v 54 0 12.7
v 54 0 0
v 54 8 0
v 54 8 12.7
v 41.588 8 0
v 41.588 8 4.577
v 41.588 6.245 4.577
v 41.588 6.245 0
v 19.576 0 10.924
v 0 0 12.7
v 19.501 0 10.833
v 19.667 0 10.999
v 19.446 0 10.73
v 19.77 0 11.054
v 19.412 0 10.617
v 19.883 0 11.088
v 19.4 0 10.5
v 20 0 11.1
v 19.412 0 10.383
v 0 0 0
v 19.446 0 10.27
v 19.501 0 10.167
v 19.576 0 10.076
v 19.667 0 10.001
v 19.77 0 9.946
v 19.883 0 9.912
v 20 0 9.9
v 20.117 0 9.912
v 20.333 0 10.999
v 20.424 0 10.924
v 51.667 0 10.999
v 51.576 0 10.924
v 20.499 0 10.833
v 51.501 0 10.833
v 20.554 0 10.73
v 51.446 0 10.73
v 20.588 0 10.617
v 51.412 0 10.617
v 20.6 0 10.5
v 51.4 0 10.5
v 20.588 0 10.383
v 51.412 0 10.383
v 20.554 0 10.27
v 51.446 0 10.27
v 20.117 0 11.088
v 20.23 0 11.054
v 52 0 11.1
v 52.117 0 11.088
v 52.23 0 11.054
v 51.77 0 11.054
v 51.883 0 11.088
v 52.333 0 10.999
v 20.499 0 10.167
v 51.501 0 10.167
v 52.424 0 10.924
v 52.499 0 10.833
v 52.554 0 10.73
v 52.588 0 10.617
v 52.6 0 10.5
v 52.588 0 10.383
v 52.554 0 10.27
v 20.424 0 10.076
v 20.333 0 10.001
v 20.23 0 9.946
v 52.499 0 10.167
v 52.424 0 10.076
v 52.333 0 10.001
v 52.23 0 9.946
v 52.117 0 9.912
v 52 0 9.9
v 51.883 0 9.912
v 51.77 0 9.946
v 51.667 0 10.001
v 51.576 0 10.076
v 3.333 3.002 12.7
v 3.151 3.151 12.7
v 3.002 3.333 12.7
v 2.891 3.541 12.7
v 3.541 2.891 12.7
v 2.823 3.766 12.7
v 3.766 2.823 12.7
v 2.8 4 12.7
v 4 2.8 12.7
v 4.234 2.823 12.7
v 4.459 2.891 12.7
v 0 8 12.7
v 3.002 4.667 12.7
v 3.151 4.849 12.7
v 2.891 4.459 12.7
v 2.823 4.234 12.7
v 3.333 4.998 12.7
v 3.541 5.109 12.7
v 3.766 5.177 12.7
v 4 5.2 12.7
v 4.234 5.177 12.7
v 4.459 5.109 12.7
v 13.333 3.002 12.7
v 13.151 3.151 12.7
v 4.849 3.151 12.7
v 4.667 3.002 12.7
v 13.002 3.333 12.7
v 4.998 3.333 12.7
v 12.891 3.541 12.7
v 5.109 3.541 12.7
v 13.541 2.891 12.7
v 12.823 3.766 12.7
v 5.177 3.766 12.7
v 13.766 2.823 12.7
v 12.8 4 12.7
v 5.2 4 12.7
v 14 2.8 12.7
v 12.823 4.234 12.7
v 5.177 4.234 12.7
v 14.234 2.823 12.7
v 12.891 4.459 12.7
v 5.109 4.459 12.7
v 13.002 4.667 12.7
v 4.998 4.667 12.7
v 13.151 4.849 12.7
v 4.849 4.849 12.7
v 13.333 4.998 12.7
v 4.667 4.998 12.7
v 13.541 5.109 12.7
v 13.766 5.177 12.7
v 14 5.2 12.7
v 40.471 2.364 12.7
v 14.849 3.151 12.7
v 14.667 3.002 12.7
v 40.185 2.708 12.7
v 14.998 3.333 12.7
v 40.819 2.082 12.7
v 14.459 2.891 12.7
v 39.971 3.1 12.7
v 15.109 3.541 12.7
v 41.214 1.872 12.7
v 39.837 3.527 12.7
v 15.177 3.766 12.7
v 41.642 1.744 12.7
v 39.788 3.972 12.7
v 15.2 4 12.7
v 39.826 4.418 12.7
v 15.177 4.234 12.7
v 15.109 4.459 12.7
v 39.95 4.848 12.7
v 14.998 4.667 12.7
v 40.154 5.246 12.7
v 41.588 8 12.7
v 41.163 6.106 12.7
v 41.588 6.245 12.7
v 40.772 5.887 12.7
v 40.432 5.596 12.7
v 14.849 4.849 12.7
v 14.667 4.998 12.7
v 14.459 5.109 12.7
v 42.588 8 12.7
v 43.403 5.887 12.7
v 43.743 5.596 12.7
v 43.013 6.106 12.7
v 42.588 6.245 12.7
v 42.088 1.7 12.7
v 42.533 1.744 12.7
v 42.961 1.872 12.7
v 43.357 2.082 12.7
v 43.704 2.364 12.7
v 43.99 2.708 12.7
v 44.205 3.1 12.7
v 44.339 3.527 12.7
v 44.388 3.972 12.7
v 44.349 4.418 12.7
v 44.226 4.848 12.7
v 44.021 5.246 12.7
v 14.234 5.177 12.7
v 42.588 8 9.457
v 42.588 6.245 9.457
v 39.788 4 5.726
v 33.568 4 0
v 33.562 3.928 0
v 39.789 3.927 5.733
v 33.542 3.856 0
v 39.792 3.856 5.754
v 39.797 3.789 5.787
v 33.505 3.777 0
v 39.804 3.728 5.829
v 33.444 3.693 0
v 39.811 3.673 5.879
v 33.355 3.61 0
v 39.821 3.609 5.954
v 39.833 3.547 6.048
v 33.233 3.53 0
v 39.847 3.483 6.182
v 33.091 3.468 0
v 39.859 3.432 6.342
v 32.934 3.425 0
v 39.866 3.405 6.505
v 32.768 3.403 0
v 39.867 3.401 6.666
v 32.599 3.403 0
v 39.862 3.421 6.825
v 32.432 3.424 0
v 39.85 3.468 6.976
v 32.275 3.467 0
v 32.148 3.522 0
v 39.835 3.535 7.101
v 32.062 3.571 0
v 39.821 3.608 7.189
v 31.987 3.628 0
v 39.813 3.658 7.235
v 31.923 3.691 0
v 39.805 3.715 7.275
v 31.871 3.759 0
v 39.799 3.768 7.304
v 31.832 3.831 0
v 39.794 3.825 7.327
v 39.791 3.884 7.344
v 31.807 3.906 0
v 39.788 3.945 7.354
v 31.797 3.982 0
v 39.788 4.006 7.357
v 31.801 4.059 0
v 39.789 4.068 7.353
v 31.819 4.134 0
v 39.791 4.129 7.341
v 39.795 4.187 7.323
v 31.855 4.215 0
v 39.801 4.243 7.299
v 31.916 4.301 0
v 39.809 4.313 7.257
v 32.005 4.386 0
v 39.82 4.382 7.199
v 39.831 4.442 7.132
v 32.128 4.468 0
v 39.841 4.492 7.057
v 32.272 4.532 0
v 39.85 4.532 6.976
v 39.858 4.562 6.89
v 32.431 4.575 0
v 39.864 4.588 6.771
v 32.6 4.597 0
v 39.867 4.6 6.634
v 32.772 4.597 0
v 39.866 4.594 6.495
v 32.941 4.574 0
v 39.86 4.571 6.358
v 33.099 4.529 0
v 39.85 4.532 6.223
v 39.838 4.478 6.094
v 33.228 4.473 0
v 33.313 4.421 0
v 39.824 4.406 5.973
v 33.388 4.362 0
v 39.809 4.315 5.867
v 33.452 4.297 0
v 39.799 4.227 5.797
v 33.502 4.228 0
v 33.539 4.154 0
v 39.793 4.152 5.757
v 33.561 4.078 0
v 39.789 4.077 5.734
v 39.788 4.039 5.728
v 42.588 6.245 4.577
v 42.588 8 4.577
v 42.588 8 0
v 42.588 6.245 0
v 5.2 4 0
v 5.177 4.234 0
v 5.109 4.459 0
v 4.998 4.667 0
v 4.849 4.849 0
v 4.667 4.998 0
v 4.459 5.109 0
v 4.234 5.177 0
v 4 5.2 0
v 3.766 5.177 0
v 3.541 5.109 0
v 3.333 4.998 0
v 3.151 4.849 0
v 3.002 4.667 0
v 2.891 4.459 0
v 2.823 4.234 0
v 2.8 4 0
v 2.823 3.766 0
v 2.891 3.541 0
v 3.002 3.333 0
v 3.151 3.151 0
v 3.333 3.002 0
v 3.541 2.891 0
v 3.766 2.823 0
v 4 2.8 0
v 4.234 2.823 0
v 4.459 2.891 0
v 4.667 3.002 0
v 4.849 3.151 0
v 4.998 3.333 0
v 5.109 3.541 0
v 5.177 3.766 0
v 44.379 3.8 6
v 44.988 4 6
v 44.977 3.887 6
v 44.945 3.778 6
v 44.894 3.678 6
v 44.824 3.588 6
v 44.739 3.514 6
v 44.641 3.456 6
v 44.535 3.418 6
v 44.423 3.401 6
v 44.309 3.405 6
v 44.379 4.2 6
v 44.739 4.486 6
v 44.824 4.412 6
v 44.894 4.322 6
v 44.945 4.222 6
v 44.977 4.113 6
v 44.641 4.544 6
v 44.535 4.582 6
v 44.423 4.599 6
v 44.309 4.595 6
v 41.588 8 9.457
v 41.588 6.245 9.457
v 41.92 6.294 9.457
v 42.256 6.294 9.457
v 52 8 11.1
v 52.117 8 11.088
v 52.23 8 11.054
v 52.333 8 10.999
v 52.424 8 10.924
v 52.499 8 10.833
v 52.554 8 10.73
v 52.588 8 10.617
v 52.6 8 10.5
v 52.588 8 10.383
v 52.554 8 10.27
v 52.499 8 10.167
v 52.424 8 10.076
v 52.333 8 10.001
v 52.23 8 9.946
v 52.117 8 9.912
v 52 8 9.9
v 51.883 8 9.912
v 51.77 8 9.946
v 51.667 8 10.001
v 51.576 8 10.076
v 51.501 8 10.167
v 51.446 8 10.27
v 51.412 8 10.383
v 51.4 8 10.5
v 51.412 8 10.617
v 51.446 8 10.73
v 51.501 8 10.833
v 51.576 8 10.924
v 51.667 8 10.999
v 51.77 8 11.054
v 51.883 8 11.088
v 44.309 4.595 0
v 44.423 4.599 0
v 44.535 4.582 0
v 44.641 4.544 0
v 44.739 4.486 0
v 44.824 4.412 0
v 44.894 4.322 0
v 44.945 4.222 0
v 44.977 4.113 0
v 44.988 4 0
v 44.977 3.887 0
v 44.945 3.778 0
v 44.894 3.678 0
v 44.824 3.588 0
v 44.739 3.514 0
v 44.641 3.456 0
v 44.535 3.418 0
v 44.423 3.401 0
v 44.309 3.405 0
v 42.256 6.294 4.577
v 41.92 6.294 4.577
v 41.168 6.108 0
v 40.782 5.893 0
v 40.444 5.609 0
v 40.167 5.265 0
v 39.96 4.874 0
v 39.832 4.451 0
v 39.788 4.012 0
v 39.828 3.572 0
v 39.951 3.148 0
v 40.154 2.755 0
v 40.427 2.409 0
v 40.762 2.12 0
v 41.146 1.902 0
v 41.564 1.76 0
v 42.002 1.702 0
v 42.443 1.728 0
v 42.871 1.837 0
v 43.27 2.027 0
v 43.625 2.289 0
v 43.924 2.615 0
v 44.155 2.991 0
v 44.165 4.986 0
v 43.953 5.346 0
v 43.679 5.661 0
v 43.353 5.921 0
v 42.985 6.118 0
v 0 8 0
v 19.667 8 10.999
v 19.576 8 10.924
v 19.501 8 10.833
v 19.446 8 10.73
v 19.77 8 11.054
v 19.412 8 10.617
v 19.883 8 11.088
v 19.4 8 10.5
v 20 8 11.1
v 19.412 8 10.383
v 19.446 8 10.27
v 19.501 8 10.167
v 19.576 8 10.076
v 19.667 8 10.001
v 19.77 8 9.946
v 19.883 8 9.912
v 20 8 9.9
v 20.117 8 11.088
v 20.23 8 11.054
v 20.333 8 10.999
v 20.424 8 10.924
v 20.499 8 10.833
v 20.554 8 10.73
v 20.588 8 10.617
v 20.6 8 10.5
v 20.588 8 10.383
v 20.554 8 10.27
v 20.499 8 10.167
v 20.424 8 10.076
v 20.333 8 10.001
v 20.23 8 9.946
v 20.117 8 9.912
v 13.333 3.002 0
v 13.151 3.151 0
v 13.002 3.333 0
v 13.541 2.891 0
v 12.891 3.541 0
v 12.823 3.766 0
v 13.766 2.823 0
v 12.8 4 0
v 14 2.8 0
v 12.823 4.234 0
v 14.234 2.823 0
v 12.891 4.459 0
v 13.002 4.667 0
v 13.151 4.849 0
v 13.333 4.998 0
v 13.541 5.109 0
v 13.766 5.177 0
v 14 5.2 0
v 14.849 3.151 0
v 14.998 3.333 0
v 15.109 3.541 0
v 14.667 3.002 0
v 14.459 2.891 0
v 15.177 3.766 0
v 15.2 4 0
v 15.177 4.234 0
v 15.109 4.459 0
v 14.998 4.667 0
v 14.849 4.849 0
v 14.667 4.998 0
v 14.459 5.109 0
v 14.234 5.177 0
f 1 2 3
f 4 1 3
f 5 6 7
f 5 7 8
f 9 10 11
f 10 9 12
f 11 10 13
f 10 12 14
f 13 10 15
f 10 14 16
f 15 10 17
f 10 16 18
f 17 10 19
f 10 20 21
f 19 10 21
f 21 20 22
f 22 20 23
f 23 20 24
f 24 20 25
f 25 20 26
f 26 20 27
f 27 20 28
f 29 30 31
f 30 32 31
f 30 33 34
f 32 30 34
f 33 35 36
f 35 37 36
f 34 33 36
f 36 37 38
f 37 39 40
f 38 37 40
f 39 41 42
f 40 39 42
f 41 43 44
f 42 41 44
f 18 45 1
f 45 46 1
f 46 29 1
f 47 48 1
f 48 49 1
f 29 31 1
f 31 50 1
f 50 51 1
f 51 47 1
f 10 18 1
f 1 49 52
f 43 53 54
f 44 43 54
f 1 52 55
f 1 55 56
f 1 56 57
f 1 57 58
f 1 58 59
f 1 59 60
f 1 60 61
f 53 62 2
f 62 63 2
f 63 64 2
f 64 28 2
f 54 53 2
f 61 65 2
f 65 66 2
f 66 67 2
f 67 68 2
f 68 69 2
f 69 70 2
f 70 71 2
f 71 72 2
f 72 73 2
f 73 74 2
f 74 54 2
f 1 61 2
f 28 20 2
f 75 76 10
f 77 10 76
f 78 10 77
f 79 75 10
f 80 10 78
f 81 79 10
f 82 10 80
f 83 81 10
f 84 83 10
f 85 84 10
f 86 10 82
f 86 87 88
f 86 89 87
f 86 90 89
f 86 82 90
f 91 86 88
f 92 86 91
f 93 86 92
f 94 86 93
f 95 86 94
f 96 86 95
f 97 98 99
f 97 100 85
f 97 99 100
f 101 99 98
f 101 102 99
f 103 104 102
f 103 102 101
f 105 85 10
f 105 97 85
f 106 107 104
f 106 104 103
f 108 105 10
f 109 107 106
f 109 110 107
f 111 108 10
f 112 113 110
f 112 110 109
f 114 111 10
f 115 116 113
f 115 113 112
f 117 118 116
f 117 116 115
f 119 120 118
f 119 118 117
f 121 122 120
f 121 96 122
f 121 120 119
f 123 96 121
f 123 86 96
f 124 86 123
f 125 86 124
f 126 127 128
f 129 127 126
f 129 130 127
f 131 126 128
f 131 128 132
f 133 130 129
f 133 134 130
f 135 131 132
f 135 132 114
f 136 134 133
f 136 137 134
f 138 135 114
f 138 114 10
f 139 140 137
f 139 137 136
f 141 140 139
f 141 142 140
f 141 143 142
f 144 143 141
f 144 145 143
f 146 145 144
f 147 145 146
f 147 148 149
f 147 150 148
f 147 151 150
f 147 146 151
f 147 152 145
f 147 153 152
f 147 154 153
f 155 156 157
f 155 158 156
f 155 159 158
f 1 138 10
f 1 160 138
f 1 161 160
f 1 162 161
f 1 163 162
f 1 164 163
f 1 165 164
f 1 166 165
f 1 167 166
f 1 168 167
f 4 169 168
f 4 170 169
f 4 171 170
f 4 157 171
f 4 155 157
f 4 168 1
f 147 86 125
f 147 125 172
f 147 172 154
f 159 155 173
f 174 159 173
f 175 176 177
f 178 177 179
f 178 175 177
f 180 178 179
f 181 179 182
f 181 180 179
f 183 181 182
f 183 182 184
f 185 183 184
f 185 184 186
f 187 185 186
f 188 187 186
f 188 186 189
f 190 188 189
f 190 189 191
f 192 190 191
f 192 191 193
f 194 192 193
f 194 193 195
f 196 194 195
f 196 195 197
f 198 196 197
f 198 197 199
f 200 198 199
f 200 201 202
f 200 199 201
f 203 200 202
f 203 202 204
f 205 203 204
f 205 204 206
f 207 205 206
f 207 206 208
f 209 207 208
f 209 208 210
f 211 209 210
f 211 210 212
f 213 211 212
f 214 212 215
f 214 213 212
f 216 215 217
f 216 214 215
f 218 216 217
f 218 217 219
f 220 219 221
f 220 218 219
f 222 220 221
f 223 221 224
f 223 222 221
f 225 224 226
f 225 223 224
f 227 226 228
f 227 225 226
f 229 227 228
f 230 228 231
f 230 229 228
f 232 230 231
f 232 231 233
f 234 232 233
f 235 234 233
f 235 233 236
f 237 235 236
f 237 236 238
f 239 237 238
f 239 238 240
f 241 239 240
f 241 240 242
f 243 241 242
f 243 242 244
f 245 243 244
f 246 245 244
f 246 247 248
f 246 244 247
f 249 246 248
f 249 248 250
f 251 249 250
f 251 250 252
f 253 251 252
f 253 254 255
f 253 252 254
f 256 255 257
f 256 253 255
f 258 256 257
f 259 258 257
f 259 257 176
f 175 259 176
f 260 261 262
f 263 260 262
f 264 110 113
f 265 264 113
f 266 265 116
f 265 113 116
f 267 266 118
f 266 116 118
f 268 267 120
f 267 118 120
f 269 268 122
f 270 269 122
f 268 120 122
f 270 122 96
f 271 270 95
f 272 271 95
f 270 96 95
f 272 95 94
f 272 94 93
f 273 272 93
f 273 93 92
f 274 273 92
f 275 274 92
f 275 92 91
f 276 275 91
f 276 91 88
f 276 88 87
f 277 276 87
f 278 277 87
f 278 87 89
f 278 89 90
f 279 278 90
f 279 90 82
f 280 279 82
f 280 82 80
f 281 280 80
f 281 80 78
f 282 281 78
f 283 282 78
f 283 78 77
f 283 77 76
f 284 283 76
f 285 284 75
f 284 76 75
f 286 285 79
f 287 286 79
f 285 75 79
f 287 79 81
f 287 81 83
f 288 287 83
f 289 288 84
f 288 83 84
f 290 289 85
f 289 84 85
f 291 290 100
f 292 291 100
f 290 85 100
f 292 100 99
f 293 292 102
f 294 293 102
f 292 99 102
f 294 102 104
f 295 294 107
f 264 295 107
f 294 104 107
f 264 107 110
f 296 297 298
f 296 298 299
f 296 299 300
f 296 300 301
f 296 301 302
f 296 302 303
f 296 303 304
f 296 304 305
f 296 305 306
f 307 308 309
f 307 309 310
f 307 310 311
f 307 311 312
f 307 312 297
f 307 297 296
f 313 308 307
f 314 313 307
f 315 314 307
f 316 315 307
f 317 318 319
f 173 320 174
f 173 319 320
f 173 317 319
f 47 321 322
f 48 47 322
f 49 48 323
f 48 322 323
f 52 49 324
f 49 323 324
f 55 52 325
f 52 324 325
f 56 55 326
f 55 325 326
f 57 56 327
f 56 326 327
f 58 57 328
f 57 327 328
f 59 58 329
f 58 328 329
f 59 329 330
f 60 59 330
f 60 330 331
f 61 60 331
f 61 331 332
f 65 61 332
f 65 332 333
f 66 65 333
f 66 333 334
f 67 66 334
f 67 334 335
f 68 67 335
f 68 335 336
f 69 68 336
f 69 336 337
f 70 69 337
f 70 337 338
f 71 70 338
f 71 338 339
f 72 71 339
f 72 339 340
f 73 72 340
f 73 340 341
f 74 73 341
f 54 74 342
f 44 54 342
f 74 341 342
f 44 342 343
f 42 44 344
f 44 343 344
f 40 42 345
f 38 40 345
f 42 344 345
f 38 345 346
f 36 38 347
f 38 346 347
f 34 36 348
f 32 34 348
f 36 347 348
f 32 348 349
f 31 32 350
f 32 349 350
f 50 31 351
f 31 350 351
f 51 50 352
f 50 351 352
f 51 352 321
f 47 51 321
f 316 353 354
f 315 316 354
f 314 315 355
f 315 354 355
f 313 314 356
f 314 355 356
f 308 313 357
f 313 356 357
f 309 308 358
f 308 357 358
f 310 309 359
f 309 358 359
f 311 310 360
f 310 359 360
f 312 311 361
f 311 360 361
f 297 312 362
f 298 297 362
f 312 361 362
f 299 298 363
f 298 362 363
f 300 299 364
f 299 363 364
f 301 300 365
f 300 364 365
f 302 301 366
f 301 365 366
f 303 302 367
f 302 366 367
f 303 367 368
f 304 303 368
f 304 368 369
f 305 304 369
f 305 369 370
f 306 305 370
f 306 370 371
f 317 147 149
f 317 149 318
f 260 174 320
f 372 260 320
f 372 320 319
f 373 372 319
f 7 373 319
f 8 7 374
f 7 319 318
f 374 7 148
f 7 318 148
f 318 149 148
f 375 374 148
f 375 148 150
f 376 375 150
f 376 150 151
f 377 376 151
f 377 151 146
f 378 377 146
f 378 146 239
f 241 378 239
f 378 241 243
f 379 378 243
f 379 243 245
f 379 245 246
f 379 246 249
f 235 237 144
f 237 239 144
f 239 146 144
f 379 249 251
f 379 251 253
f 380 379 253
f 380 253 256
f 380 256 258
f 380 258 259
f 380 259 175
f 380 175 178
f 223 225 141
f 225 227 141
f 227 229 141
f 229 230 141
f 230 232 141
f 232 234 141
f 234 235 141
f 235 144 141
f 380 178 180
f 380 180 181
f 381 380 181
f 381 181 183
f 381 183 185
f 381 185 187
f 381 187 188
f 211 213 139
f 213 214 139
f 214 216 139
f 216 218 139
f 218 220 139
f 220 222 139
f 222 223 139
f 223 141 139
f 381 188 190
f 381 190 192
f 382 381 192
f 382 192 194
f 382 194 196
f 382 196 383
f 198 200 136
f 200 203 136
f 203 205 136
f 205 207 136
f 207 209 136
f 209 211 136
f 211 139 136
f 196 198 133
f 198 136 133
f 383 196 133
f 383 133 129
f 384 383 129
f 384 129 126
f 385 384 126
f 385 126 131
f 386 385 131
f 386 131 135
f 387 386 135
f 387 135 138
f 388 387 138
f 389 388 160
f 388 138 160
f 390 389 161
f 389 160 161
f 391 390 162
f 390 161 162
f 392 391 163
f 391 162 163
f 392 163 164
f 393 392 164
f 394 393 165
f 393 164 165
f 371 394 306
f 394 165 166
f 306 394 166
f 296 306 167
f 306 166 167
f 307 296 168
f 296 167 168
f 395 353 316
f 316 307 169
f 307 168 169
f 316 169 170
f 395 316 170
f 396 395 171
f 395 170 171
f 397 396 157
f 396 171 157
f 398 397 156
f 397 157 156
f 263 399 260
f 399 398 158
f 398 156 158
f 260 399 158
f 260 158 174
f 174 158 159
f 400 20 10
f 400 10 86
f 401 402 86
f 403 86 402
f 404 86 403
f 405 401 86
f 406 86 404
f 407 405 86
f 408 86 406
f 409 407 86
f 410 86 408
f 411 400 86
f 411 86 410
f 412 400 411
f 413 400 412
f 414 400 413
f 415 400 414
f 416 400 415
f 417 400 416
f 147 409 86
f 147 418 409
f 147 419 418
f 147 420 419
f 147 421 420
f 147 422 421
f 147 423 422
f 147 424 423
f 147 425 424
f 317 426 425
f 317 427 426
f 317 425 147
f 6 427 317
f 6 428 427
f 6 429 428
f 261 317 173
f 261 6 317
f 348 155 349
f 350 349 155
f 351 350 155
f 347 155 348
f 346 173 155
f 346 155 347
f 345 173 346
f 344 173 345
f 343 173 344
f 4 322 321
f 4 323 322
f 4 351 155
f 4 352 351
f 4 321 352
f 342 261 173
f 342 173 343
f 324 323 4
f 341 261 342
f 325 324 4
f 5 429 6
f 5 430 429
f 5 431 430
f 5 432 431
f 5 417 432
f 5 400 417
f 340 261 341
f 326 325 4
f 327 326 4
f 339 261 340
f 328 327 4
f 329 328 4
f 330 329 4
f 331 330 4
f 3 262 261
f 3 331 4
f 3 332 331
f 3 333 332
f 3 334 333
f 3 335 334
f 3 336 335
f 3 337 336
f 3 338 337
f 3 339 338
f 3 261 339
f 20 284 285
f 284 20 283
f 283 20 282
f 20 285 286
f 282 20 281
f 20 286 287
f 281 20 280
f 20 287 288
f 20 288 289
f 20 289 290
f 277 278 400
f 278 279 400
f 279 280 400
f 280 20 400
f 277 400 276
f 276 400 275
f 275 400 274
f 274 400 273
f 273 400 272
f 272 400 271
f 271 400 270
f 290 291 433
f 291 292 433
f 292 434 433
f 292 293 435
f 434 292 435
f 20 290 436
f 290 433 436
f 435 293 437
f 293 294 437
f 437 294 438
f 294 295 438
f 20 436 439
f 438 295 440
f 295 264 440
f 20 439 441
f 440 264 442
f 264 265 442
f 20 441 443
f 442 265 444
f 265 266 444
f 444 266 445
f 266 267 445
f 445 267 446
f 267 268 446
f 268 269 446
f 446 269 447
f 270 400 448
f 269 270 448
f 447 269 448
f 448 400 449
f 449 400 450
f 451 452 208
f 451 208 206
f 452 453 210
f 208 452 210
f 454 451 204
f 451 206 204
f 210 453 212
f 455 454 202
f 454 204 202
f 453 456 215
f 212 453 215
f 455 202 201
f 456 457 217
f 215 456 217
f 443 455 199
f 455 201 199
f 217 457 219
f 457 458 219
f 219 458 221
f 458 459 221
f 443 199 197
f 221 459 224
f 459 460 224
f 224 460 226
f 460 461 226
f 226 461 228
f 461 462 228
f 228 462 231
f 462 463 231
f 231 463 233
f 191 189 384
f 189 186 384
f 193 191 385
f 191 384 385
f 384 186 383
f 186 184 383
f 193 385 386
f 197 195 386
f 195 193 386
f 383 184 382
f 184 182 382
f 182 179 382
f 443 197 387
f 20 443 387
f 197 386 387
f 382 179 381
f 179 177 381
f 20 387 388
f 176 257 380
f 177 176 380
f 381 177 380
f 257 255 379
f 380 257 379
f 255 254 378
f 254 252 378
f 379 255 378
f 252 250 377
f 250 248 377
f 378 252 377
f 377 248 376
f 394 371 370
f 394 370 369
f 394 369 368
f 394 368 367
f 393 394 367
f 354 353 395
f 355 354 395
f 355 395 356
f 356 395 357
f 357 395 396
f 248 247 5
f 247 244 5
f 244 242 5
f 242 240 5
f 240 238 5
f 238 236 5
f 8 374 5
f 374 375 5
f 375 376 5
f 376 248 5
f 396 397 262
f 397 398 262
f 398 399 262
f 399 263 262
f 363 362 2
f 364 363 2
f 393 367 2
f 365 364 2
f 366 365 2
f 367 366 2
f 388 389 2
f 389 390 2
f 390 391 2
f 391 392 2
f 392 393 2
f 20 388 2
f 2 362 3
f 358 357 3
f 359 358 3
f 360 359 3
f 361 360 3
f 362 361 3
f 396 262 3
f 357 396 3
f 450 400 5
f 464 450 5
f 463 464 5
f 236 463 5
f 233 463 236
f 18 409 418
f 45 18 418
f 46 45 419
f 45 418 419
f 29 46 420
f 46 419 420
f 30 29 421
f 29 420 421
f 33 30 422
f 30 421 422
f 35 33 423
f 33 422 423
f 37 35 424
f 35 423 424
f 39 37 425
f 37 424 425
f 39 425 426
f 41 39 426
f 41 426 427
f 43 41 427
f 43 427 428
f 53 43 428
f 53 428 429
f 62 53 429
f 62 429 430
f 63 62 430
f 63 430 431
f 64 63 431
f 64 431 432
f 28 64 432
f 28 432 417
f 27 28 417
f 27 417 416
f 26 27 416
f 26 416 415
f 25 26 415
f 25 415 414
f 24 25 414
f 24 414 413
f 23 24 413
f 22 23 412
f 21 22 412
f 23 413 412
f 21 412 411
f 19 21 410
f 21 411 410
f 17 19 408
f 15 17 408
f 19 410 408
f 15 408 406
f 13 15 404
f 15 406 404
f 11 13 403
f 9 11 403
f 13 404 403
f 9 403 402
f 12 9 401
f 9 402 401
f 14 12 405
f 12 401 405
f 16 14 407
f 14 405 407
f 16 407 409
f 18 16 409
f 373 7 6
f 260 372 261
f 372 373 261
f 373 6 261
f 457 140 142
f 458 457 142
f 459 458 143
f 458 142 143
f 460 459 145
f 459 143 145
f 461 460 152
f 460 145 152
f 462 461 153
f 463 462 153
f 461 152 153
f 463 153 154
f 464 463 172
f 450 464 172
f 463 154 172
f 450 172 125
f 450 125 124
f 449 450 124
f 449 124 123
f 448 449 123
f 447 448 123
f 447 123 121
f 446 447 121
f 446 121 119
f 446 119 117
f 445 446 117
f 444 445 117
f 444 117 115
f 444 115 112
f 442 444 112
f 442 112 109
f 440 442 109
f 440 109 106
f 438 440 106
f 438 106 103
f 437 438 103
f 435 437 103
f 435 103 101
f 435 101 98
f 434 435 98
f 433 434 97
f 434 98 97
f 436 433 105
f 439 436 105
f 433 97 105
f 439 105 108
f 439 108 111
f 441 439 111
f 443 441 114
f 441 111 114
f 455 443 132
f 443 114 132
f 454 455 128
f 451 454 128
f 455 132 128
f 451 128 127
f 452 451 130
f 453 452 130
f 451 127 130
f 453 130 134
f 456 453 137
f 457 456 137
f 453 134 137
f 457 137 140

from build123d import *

# Parameters (mm, degrees)
SKETCH1_W           = 54
SKETCH1_H           = 8
BOSS_EXTRUDE1_DEPTH = 12.7
SKETCH3_W           = 1
SKETCH3_H           = 3.243111396
SKETCH3_H_2         = 4.577374163
CUT_EXTRUDE1_DEPTH  = 2
SKETCH4_R           = 2.3
CUT_EXTRUDE2_DEPTH  = 57.047212241
SKETCH5_R           = 0.6
CUT_EXTRUDE3_DEPTH  = 57.047212241
SKETCH6_R           = 1.2
CUT_EXTRUDE4_DEPTH  = 57.047212241
SKETCH12_R          = 0.6
CUT_EXTRUDE6_DEPTH  = 15
SKETCH14_R          = 0.6
CUT_EXTRUDE7_DEPTH  = 6


with BuildPart() as part:
    # Sketch1 → Boss-Extrude1 (new body)
    with BuildSketch(Plane.XY):
        with Locations((27, 4)):
            Rectangle(SKETCH1_W, SKETCH1_H)
    extrude(amount=BOSS_EXTRUDE1_DEPTH)

    # Sketch3 → Cut-Extrude1 (cut)
    with BuildSketch(Plane(origin=(0, 8, 0), x_dir=(1, 0, 0), z_dir=(0, 1, 0))):
        with Locations((42.087715046, -11.078444302)):
            Rectangle(SKETCH3_W, SKETCH3_H)
        with Locations((42.087715046, -2.288687081)):
            Rectangle(SKETCH3_W, SKETCH3_H_2)
    extrude(amount=-CUT_EXTRUDE1_DEPTH, mode=Mode.SUBTRACT)

    # Sketch4 → Cut-Extrude2 (cut, through all)
    with BuildSketch(Plane.XY.offset(12.7)):
        with Locations(Location((42.087715046, 4, 0), (0, 0, 77.444142201))):
            Circle(SKETCH4_R)
    extrude(amount=-CUT_EXTRUDE2_DEPTH, mode=Mode.SUBTRACT)

    # Sketch5 → Cut-Extrude3 (cut, through all)
    with BuildSketch(Plane(origin=(0, 8, 0), x_dir=(1, 0, 0), z_dir=(0, 1, 0))):
        with Locations(Location((52, -10.5, 0), (0, 0, 270))):
            Circle(SKETCH5_R)
        with Locations(Location((20, -10.5, 0), (0, 0, 270))):
            Circle(SKETCH5_R)
    extrude(amount=-CUT_EXTRUDE3_DEPTH, mode=Mode.SUBTRACT)

    # Sketch6 → Cut-Extrude4 (cut, through all)
    with BuildSketch(Plane.XY.offset(12.7)):
        with Locations((4, 4)):
            Circle(SKETCH6_R)
        with Locations((14, 4)):
            Circle(SKETCH6_R)
    extrude(amount=-CUT_EXTRUDE4_DEPTH, mode=Mode.SUBTRACT)

    # Sketch12 → Cut-Extrude6 (cut)
    with BuildSketch(Plane(origin=(25.944559134, 0, 23.885086629), x_dir=(-0.677303634830695, 0, 0.7357035994509805), z_dir=(-0.7357035994509805, 0, -0.677303634830695))):
        with Locations(Location((-22.135860185, 4, 0), (0, 0, 180))):
            Circle(SKETCH12_R)
    extrude(amount=CUT_EXTRUDE6_DEPTH, mode=Mode.SUBTRACT)

    # Sketch14 → Cut-Extrude7 (cut)
    with BuildSketch(Plane(origin=(0, 0, 0), x_dir=(-1, 0, 0), z_dir=(0, 0, -1))):
        with Locations((-44.387715046, 4)):
            Circle(SKETCH14_R)
    extrude(amount=-CUT_EXTRUDE7_DEPTH, mode=Mode.SUBTRACT)


solid = part.part
